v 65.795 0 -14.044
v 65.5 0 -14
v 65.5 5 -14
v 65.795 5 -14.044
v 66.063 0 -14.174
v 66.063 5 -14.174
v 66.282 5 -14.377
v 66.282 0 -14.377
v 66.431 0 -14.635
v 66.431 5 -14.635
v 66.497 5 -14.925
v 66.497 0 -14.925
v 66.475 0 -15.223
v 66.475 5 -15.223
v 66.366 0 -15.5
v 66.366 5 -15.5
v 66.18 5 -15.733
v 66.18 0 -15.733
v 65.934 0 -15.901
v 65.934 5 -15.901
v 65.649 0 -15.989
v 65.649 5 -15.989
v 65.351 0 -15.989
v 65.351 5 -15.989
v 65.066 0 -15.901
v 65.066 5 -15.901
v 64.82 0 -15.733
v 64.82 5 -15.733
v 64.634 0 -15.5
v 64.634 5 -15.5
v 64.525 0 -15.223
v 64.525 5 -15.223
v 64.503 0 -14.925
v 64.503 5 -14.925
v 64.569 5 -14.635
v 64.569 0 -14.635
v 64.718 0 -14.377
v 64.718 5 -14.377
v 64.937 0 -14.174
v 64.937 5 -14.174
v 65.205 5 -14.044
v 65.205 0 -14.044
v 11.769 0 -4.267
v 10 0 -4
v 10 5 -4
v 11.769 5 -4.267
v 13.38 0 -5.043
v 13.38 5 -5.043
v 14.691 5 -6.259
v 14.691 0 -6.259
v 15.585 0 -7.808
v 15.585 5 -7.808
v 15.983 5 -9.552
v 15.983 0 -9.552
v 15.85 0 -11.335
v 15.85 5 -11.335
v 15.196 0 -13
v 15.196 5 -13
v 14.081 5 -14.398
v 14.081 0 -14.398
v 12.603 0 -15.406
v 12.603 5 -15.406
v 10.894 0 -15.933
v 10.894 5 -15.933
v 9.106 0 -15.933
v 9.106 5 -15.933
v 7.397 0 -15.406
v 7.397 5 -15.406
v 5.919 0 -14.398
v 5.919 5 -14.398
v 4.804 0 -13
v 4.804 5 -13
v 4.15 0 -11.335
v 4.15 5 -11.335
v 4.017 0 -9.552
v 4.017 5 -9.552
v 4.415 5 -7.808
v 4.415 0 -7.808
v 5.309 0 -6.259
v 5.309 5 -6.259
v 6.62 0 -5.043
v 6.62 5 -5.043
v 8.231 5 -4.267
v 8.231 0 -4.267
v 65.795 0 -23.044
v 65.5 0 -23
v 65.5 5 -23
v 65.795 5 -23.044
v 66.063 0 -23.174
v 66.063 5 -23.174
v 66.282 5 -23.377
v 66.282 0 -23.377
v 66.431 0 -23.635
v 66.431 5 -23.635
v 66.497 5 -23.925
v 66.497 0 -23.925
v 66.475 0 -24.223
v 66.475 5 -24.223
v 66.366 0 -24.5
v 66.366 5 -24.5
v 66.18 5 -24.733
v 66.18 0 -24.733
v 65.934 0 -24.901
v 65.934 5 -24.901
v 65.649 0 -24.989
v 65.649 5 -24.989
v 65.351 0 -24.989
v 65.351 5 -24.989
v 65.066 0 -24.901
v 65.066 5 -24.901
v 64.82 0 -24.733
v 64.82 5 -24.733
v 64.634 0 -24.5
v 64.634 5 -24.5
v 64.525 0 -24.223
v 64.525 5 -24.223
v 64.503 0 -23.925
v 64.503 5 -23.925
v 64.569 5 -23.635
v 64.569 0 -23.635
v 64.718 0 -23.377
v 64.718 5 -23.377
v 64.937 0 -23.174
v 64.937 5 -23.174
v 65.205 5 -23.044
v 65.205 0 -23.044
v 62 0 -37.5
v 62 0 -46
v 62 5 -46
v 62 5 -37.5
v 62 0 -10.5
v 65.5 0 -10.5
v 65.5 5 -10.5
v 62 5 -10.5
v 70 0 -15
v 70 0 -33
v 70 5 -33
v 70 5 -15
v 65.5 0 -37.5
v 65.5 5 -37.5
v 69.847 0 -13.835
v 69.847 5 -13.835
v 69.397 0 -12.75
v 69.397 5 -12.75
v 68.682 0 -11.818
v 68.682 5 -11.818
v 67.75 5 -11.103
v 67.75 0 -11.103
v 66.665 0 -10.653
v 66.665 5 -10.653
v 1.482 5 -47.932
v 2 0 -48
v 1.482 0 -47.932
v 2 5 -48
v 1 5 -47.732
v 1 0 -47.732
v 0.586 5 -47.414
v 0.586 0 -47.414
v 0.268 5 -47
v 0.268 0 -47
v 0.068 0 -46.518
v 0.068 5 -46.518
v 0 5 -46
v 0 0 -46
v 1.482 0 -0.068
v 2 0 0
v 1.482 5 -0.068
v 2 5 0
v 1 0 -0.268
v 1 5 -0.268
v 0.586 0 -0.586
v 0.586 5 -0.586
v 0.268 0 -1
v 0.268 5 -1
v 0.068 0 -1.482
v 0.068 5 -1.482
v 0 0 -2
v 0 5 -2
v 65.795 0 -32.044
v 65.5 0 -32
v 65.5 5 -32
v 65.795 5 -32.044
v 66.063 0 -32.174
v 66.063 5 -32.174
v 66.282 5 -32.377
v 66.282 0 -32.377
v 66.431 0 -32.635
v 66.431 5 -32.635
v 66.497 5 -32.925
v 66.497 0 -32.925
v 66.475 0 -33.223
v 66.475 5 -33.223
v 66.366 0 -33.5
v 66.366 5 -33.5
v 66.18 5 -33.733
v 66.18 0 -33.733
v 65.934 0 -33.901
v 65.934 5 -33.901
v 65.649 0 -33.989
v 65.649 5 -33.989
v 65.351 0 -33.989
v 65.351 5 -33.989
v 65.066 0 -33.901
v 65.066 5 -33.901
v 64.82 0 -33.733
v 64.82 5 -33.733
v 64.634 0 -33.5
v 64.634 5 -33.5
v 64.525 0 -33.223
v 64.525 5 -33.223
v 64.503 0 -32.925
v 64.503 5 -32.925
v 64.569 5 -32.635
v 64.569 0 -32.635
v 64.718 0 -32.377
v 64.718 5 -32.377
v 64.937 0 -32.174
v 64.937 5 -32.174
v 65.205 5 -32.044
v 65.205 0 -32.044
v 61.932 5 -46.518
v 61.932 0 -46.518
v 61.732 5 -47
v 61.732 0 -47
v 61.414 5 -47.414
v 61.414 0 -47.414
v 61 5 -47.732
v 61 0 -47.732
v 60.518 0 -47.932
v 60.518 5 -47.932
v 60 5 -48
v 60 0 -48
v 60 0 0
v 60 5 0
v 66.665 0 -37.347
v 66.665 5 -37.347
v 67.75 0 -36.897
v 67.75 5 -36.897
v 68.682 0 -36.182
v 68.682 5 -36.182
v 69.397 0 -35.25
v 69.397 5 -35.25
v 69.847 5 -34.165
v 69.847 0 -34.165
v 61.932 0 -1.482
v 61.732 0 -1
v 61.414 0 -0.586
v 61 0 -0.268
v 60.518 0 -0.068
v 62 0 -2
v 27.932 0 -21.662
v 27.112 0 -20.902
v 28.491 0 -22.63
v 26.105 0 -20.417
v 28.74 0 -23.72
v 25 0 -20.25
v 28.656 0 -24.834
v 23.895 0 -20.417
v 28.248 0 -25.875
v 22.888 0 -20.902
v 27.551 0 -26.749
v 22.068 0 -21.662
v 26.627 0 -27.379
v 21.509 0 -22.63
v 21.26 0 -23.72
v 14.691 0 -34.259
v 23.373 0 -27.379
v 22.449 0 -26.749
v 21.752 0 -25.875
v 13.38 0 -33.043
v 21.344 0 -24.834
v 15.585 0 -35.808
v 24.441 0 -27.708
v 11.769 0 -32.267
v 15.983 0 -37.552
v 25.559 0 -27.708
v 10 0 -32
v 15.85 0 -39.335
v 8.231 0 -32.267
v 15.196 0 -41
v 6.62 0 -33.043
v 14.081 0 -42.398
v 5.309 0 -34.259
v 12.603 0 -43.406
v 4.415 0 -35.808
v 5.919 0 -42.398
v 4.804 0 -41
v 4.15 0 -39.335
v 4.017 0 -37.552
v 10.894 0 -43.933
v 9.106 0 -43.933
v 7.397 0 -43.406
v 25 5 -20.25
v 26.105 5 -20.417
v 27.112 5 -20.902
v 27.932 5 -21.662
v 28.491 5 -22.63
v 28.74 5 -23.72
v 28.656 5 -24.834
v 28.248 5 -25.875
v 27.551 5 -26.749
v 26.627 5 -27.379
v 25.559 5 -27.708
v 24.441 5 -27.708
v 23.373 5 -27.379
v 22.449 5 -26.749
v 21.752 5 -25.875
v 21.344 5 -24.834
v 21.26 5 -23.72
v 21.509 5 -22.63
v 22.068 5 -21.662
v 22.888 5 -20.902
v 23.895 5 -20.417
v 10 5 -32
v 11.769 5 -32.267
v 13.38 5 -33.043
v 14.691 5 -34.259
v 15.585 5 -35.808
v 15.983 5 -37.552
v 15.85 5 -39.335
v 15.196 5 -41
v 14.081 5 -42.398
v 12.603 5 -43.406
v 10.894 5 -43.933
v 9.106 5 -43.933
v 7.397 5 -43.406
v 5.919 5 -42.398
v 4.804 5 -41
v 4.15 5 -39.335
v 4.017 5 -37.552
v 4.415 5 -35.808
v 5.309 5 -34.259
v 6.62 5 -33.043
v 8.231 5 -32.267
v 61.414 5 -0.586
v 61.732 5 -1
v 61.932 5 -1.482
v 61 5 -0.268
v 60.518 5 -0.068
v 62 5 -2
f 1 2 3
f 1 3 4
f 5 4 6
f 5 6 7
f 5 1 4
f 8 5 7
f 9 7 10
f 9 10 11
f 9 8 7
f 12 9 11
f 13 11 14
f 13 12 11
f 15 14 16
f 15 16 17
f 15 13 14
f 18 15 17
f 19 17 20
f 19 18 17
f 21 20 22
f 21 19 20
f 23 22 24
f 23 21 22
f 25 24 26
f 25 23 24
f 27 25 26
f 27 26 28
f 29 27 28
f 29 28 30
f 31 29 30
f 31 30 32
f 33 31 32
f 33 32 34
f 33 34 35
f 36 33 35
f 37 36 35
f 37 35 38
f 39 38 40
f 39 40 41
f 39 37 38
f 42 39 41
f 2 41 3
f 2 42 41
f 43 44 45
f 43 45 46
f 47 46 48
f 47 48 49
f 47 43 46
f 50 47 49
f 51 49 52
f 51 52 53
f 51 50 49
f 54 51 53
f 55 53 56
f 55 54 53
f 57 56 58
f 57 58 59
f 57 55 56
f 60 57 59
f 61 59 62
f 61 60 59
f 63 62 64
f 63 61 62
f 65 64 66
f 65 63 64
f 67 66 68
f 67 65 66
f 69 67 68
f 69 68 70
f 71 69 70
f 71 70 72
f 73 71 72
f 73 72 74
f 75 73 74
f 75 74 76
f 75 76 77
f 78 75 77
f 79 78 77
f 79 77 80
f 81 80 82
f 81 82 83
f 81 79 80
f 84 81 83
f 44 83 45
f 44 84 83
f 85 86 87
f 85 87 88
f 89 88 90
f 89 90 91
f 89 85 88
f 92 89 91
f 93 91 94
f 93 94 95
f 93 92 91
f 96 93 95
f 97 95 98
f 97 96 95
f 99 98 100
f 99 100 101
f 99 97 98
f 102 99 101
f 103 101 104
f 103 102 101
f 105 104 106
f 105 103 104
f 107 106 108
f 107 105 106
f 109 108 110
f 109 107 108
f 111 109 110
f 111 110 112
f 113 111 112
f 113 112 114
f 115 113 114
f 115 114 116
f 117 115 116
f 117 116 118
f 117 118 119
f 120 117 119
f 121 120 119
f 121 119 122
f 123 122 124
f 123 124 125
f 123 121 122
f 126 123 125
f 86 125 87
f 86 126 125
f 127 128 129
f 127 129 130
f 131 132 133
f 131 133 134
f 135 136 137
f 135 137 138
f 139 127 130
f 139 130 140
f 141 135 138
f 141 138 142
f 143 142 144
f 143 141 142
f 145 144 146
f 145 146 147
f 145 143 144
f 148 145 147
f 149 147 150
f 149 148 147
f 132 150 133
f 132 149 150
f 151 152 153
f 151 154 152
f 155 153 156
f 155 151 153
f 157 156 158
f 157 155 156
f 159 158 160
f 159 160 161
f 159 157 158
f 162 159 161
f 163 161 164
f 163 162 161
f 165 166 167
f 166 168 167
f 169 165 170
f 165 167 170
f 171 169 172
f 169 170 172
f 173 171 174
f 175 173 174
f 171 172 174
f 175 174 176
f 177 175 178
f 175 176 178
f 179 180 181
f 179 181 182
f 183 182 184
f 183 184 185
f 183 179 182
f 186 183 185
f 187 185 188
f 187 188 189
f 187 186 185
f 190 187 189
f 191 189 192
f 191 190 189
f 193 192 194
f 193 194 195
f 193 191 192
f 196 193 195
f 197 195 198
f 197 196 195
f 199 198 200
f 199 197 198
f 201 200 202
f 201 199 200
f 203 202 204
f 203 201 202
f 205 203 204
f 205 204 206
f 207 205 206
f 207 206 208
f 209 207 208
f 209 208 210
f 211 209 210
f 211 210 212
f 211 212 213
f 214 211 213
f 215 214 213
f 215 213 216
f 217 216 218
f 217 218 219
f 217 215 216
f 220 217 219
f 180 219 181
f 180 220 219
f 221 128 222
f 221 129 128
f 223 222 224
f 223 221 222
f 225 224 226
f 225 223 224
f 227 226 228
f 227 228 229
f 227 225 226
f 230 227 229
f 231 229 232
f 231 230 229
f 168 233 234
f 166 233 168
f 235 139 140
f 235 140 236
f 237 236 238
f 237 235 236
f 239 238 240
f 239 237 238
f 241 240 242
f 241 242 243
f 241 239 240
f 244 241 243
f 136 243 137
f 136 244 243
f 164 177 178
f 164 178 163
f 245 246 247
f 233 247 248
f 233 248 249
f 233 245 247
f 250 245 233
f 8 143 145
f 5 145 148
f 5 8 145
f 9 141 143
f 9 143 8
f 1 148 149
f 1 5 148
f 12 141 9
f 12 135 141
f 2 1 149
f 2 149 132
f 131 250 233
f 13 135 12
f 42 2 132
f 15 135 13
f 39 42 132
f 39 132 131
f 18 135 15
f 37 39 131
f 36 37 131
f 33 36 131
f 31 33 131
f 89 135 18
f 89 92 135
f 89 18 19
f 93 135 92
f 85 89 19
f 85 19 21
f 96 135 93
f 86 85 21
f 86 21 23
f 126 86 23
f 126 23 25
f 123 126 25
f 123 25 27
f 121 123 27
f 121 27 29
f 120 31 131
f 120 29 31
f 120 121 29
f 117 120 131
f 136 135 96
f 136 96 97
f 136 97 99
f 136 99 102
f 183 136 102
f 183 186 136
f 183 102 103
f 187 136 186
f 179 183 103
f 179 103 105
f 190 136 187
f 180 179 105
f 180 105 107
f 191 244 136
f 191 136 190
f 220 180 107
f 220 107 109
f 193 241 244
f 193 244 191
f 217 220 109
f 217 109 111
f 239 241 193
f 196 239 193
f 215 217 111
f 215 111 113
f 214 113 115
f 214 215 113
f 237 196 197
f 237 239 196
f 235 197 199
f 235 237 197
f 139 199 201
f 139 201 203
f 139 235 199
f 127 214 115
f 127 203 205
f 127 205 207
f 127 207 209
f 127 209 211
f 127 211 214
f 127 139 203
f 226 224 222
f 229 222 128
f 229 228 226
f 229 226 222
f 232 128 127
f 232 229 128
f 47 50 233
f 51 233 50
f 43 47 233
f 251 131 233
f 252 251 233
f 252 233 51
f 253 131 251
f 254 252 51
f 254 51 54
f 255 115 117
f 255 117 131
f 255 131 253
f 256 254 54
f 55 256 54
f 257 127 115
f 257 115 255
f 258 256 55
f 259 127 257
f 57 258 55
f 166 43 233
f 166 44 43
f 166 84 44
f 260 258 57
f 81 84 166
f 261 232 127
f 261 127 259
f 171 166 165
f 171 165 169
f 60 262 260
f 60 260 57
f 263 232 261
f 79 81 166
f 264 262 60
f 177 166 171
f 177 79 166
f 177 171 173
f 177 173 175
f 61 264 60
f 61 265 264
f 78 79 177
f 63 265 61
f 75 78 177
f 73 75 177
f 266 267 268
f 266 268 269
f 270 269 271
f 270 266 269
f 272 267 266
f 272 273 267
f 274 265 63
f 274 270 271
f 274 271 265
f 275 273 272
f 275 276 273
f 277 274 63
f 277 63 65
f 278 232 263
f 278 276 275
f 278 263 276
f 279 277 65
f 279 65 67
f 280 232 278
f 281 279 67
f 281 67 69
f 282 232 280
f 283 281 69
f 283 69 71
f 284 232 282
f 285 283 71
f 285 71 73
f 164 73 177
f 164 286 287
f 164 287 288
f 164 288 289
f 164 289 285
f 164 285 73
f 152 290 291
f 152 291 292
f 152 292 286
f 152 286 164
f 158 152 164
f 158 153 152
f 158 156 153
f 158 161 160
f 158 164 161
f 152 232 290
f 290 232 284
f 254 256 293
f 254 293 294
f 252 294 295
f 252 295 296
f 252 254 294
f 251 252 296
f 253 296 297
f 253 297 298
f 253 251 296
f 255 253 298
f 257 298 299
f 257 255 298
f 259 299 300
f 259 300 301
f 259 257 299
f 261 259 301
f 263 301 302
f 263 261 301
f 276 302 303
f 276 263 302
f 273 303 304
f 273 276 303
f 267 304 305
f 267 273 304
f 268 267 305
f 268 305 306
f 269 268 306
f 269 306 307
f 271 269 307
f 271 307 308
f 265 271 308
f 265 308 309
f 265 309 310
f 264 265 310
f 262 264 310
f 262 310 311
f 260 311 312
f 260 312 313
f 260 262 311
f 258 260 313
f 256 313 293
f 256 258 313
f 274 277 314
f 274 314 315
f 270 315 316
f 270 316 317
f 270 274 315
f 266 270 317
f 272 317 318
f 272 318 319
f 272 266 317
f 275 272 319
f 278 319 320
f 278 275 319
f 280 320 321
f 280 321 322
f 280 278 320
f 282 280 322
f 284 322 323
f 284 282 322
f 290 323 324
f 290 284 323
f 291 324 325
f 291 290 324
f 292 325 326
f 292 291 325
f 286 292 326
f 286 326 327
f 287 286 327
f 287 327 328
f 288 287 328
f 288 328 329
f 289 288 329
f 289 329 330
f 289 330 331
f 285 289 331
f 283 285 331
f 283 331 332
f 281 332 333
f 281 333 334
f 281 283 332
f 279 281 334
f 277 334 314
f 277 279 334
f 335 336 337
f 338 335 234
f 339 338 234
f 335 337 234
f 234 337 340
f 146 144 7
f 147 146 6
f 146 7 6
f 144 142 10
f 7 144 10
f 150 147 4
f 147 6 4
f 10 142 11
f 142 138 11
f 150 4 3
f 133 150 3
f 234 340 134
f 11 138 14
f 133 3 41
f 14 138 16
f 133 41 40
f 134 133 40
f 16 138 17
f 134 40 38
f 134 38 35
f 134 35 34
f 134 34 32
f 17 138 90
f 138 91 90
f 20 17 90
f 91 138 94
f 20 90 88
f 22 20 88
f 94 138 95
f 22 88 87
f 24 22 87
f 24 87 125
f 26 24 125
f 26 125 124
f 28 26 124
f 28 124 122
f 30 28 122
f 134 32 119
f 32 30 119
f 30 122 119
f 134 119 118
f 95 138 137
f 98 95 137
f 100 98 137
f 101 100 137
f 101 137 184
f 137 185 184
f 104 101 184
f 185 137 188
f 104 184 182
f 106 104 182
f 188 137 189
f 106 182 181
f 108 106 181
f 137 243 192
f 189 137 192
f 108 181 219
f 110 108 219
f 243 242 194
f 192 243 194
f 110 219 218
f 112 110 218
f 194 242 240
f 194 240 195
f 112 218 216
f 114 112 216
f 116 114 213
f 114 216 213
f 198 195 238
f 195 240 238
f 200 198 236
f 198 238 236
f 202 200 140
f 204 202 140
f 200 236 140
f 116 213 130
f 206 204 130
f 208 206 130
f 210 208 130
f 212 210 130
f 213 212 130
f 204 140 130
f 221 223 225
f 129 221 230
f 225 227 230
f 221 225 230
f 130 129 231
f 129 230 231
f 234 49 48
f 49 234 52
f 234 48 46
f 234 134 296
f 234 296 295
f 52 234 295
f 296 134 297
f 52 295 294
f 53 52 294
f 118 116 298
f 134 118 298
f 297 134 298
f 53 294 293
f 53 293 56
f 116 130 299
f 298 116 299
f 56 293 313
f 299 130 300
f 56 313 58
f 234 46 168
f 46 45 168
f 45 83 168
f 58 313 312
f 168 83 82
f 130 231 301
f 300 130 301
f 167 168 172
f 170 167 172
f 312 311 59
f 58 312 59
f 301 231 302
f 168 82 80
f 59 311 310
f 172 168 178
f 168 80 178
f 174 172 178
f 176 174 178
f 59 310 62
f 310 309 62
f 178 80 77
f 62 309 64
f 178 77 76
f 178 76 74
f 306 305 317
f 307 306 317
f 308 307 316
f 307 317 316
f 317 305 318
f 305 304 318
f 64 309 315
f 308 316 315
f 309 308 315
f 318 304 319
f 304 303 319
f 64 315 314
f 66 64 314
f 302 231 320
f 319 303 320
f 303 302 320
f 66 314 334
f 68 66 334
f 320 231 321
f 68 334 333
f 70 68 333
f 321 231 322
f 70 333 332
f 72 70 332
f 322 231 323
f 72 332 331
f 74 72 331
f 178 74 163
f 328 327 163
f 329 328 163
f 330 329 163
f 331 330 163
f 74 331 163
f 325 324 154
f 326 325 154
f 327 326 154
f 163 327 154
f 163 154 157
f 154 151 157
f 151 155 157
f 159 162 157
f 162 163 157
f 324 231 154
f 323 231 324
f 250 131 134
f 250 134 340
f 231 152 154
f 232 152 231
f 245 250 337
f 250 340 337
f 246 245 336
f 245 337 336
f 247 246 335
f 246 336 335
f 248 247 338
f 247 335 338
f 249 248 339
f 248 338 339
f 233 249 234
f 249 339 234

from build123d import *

# Parameters (mm, degrees)
SKETCH1_R           = 6
SKETCH1_R_2         = 3.75
SKETCH1_R_3         = 1
BOSS_EXTRUDE1_DEPTH = 5
FILLET1_R           = 2


with BuildPart() as part:
    # Sketch1 → Boss-Extrude1 (new body)
    with BuildSketch(Plane(origin=(0, 0, 0), x_dir=(1, 0, 0), z_dir=(0, 1, 0))):
        with BuildLine():
            Line((70, 33), (70, 15))
            ThreePointArc((70, 15), (68.681980515, 11.818019485), (65.5, 10.5))
            Line((65.5, 10.5), (62, 10.5))
            Line((62, 10.5), (62, 0))
            Line((62, 0), (0, 0))
            Line((0, 0), (0, 48))
            Line((0, 48), (62, 48))
            Line((62, 48), (62, 37.5))
            Line((62, 37.5), (65.5, 37.5))
            ThreePointArc((65.5, 37.5), (68.681980515, 36.181980515), (70, 33))
        make_face()
        with Locations(Location((10, 10, 0), (0, 0, 270))):
            Circle(SKETCH1_R, mode=Mode.SUBTRACT)
        with Locations(Location((10, 38, 0), (0, 0, 270))):
            Circle(SKETCH1_R, mode=Mode.SUBTRACT)
        with Locations(Location((25, 24, 0), (0, 0, 270))):
            Circle(SKETCH1_R_2, mode=Mode.SUBTRACT)
        with Locations(Location((65.5, 15, 0), (0, 0, 270))):
            Circle(SKETCH1_R_3, mode=Mode.SUBTRACT)
        with Locations(Location((65.5, 24, 0), (0, 0, 270))):
            Circle(SKETCH1_R_3, mode=Mode.SUBTRACT)
        with Locations(Location((65.5, 33, 0), (0, 0, 270))):
            Circle(SKETCH1_R_3, mode=Mode.SUBTRACT)
    extrude(amount=BOSS_EXTRUDE1_DEPTH)

    # Fillet1
    fillet1_edges = [part.edges().sort_by_distance(p)[0] for p in [
        (62, 2.5, 0),
        (0, 2.5, 0),
        (0, 2.5, -48),
        (62, 2.5, -48),
    ]]
    fillet(fillet1_edges, radius=FILLET1_R)


solid = part.part
